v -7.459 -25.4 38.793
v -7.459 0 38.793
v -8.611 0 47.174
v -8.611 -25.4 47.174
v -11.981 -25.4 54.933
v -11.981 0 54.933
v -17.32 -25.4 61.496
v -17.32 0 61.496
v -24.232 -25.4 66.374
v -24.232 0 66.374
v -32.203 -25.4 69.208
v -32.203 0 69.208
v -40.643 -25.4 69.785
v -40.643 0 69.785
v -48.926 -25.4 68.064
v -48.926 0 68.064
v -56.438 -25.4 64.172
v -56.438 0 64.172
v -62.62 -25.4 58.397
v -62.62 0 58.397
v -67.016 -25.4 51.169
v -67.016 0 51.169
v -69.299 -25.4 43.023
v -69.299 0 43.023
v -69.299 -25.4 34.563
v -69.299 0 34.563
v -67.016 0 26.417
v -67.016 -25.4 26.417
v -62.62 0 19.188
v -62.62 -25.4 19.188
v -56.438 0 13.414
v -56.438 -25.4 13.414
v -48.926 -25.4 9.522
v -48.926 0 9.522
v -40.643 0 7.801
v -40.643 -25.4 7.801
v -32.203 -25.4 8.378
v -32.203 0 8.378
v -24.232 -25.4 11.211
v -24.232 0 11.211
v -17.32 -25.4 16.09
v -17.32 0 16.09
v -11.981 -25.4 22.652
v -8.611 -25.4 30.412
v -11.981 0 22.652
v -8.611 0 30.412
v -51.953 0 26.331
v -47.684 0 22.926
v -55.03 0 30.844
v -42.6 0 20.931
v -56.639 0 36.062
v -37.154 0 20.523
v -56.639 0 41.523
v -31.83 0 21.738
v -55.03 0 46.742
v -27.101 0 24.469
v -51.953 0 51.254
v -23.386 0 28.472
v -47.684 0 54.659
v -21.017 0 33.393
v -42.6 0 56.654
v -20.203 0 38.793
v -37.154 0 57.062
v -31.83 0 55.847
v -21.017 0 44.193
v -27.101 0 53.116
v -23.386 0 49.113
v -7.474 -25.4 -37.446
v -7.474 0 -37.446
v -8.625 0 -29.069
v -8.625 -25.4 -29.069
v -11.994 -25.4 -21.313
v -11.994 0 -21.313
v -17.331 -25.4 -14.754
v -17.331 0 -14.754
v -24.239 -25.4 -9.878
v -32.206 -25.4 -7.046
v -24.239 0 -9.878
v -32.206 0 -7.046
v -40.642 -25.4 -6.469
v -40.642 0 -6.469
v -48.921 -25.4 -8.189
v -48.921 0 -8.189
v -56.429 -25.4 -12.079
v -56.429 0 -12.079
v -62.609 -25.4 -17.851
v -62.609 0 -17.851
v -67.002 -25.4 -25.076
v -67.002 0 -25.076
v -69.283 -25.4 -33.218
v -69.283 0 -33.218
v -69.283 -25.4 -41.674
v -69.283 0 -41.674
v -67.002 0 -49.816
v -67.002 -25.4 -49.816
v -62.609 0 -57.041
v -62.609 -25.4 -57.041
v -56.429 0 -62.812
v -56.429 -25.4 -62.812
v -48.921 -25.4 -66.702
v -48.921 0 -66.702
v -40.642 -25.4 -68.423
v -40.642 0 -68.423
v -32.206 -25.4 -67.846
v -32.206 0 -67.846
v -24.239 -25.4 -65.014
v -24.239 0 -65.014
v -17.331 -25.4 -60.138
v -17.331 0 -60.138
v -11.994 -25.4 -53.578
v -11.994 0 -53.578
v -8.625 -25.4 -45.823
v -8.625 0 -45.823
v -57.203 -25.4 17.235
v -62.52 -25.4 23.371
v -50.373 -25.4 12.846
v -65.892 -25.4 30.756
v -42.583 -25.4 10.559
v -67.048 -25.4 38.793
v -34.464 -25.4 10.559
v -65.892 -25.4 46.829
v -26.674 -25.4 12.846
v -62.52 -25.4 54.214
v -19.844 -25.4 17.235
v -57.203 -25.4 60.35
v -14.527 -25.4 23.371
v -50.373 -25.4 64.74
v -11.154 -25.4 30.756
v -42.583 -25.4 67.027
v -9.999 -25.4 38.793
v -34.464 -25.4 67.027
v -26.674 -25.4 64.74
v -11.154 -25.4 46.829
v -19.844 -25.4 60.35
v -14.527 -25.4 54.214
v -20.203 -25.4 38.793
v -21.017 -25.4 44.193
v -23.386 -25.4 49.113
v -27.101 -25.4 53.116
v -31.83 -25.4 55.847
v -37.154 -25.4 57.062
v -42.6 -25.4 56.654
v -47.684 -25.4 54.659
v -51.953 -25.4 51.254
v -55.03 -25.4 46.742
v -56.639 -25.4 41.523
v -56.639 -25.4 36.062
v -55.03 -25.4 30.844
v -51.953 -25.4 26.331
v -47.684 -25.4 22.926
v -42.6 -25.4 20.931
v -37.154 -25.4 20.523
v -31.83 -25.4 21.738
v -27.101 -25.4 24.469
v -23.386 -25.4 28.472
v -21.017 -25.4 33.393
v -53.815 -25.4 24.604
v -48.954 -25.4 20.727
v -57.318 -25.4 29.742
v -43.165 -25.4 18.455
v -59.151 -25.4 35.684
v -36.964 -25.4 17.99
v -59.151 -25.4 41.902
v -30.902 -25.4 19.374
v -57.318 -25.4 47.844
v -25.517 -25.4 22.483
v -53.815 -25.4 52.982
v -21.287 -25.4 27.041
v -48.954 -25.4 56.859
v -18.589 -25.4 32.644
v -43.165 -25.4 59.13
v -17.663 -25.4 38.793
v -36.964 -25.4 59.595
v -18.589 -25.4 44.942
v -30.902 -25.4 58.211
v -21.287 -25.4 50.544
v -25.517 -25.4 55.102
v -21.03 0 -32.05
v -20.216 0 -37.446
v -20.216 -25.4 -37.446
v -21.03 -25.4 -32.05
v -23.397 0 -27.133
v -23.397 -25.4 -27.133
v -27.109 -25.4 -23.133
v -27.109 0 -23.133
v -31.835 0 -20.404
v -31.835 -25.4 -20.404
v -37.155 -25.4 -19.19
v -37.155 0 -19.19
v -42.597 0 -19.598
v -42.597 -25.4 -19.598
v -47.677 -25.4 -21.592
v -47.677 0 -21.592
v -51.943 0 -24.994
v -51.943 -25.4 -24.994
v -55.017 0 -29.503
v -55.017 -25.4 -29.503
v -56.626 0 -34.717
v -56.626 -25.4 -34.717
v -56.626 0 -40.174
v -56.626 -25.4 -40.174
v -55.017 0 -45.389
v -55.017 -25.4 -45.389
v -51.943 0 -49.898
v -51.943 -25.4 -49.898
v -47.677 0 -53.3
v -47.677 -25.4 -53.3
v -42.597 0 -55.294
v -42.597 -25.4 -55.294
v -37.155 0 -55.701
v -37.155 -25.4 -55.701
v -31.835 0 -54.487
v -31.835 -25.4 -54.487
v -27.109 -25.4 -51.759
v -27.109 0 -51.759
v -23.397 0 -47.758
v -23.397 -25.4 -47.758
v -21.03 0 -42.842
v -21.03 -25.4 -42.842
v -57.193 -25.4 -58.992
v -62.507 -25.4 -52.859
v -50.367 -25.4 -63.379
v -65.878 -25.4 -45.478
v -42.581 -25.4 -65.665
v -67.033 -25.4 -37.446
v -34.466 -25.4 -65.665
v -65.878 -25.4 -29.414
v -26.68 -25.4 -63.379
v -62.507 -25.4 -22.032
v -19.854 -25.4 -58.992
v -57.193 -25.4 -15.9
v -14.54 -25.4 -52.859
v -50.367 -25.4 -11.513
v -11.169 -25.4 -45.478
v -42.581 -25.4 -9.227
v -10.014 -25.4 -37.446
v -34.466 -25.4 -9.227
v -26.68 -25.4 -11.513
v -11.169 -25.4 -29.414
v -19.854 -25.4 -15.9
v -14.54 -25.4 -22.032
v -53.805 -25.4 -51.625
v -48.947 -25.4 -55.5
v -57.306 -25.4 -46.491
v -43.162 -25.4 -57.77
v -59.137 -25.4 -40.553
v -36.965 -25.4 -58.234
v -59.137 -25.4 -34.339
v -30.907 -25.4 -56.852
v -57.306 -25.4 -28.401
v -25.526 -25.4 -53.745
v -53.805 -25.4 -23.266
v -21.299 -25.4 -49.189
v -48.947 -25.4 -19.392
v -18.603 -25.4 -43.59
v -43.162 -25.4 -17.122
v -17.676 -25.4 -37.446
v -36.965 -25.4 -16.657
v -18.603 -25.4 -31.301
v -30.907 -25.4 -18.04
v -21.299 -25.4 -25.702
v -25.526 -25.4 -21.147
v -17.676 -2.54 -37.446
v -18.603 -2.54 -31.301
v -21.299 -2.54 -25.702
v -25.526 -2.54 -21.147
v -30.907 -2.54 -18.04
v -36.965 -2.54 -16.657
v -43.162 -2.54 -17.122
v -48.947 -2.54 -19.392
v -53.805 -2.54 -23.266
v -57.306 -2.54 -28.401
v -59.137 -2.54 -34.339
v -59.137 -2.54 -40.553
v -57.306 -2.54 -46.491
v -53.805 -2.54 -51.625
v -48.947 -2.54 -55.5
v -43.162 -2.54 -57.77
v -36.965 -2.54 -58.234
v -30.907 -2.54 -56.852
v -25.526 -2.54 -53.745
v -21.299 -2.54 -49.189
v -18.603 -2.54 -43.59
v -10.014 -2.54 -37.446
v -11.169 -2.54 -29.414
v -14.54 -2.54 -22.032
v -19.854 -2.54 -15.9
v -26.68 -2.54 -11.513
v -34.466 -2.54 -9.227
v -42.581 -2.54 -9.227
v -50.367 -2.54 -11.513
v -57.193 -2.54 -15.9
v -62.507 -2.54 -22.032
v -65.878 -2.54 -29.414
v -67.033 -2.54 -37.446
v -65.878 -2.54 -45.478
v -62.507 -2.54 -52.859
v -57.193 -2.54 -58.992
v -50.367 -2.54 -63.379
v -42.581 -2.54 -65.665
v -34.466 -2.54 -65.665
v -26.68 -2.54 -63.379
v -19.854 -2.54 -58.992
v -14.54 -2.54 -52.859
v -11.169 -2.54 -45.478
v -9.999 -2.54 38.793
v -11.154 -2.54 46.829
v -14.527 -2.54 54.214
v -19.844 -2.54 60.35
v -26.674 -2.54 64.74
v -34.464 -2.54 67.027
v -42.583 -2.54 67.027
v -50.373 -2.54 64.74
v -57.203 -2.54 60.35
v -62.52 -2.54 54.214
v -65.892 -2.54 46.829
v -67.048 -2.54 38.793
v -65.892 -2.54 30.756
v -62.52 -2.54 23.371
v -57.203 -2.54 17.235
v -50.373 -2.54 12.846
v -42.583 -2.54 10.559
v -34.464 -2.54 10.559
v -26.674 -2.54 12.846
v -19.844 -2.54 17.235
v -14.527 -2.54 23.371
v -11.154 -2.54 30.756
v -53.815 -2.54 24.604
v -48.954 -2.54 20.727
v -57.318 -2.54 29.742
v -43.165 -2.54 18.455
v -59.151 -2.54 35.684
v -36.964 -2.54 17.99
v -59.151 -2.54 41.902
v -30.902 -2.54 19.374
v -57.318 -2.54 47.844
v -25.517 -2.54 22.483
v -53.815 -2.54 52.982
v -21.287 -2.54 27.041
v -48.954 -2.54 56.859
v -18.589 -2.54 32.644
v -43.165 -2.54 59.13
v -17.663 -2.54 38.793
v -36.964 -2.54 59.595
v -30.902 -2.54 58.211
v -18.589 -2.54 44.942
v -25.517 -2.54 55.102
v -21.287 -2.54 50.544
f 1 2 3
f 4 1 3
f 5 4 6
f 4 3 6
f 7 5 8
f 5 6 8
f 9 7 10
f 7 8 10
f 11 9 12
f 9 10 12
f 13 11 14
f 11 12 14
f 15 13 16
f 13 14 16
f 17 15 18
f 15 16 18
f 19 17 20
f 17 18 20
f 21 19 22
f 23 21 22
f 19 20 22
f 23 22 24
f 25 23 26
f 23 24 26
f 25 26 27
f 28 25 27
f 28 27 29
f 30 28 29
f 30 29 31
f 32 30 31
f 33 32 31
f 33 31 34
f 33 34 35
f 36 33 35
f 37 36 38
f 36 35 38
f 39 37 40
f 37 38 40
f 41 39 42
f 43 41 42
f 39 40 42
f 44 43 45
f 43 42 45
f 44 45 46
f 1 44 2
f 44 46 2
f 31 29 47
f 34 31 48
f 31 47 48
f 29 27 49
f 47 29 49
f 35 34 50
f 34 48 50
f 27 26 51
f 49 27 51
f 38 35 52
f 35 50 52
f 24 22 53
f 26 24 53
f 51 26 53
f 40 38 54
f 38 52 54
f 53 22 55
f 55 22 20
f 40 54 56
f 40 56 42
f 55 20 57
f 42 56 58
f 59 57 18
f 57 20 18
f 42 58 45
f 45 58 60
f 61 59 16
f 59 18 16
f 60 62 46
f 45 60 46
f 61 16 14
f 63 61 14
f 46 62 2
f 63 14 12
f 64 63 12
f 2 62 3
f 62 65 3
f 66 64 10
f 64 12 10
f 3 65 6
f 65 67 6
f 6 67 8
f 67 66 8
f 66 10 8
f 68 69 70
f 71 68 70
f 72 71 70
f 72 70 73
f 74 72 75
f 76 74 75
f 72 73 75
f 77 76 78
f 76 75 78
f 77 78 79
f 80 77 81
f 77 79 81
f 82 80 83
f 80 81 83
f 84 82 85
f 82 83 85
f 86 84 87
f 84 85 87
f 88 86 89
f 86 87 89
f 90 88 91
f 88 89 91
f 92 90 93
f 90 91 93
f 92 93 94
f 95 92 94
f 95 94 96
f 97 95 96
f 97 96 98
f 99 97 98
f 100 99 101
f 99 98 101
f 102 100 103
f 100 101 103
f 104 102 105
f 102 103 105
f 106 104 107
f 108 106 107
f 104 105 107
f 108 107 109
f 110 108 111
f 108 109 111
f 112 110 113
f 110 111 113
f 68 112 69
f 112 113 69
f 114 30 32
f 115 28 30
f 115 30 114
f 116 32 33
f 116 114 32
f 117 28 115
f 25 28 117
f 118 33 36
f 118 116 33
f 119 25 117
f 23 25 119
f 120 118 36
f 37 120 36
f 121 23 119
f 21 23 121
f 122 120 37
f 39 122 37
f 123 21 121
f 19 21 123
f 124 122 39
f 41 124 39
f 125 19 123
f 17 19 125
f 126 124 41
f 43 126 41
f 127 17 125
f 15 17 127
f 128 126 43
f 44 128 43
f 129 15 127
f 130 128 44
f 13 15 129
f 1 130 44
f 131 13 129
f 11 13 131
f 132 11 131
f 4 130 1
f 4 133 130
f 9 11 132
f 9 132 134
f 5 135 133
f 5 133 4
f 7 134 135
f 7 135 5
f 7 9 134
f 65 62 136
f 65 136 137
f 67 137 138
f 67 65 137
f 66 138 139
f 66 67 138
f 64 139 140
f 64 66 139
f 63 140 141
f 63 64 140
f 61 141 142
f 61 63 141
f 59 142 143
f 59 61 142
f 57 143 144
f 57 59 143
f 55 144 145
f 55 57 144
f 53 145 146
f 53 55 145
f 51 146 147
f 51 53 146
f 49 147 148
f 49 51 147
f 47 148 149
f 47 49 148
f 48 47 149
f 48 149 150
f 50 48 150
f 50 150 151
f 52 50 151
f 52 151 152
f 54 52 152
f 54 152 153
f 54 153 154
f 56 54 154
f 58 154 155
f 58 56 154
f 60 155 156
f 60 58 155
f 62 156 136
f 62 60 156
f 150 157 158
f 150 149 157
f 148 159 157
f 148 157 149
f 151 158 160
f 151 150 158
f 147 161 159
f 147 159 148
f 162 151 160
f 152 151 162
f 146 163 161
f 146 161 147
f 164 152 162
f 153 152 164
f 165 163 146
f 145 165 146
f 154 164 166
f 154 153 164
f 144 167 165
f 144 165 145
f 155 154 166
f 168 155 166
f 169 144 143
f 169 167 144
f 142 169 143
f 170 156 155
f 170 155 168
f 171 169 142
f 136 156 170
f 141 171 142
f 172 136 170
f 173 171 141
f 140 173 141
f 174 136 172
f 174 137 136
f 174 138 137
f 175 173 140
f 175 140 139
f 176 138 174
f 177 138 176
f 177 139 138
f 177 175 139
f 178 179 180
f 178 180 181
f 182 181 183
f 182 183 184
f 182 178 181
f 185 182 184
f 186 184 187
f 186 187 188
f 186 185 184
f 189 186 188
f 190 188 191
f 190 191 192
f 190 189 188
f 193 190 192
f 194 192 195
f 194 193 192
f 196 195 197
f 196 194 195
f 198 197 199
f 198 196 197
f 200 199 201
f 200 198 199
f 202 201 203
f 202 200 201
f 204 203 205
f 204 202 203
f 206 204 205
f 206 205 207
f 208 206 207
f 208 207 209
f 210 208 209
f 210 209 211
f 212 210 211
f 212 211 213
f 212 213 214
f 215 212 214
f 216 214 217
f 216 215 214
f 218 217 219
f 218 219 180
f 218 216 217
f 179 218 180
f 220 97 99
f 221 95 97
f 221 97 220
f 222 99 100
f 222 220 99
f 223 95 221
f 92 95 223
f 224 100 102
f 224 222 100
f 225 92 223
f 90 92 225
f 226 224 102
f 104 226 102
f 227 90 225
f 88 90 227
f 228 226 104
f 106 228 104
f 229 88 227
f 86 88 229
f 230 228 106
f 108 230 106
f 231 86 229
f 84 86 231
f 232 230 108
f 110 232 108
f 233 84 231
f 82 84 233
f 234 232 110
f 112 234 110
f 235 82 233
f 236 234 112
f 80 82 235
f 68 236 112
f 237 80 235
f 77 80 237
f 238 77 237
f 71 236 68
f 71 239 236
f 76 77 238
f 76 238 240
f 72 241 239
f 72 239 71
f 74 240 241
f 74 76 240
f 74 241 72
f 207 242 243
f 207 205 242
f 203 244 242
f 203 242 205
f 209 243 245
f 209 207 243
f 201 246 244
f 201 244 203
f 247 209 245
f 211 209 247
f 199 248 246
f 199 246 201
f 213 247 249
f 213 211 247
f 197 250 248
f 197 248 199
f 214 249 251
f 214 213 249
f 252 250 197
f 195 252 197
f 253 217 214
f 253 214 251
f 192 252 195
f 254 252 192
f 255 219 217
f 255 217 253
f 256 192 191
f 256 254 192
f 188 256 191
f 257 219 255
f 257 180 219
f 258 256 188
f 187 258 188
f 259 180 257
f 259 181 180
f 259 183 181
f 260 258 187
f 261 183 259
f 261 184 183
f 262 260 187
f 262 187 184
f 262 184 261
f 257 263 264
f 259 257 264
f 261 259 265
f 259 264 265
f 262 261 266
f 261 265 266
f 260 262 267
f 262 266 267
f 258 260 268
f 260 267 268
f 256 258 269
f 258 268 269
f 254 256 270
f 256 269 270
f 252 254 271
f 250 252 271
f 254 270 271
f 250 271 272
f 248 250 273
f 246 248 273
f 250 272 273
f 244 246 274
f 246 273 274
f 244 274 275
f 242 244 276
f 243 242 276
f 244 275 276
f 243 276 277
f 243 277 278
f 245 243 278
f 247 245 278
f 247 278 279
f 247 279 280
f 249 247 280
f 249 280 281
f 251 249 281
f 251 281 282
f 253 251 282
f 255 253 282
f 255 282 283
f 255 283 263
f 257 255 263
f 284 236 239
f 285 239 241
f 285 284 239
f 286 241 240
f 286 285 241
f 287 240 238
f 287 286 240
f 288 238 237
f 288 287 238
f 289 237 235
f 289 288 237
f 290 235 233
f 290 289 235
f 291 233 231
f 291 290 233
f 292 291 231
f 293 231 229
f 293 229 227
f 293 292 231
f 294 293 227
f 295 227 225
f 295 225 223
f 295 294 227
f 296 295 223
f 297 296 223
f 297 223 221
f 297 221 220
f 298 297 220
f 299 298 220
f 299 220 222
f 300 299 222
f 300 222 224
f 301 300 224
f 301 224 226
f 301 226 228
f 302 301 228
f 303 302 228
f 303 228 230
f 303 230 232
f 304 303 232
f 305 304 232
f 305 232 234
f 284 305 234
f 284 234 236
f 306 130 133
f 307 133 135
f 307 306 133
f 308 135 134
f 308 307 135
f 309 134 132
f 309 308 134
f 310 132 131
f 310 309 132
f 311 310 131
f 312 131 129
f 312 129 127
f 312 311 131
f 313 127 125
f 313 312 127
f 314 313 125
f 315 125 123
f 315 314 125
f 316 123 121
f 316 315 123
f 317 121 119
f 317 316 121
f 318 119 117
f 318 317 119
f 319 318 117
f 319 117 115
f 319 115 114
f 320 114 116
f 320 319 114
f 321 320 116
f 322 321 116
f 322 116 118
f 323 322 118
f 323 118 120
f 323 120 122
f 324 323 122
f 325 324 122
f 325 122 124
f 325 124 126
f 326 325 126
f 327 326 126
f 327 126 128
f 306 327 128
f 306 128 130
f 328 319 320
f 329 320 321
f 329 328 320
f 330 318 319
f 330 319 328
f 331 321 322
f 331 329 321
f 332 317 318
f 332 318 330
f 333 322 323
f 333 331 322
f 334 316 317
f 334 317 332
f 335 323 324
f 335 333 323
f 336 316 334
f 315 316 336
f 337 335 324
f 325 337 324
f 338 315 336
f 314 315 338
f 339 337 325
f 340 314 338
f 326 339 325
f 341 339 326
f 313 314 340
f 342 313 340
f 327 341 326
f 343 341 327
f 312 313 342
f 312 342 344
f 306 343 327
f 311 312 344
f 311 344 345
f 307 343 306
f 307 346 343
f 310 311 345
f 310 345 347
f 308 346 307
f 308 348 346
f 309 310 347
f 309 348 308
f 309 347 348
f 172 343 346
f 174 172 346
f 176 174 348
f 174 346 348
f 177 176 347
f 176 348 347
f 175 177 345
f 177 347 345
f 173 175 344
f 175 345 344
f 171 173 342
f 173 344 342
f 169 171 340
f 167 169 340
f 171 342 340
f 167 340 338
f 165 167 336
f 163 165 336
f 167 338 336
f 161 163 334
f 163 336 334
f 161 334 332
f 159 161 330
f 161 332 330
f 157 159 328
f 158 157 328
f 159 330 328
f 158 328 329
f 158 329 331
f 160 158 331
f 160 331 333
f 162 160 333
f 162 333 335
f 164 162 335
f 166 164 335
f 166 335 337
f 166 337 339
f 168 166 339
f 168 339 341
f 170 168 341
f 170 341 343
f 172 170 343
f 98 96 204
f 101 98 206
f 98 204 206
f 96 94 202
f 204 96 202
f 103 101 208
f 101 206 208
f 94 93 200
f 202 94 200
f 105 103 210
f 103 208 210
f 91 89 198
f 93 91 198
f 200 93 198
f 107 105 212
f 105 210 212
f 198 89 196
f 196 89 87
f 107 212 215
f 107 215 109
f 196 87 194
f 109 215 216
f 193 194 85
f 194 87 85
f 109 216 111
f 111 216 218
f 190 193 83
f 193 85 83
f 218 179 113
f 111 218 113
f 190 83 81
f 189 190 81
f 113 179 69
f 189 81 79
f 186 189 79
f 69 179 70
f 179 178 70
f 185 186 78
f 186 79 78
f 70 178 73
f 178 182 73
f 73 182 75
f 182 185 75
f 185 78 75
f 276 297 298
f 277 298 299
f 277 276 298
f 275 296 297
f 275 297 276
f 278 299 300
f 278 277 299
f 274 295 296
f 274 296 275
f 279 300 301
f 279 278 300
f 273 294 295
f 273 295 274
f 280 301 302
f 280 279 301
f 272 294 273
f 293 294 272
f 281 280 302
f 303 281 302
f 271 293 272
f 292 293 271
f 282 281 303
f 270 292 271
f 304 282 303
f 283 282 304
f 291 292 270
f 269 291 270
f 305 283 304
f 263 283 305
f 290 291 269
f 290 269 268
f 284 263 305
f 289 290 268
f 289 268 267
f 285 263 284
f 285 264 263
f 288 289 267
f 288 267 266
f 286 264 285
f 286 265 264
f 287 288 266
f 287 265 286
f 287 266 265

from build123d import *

# Parameters (mm, degrees)
F0_R     = 31.0645198861
F0_R_2   = 18.3207695428
F1_DEPTH = 25.4
F0_R_3   = 31.0493317599
F0_R_4   = 18.3069012544
F2_T     = -2.54
F2_2_T   = -2.54


with BuildPart() as f1:
    # F0 (on Front) → F1 (new body)
    with BuildSketch(Plane.XZ):
        with Locations((-38.5233350098, 38.7927293777)):
            Circle(F0_R)
        with Locations((-38.5233350098, 38.7927293777)):
            Circle(F0_R_2, mode=Mode.SUBTRACT)
    extrude(amount=F1_DEPTH)

    # F2
    f2_openings = [f1.faces().sort_by_distance(p)[0] for p in [
        (-68.709218, -25.4, 38.792729),
    ]]
    offset(amount=F2_T, openings=f2_openings)


with BuildPart() as f1b:
    # F0 (on Front) → F1, piece 2 (new body)
    with BuildSketch(Plane.XZ):
        with Locations((-38.5233350098, -37.4457575381)):
            Circle(F0_R_3)
        with Locations((-38.5233350098, -37.4457575381)):
            Circle(F0_R_4, mode=Mode.SUBTRACT)
    extrude(amount=F1_DEPTH)

    # F2#2
    f2_2_openings = [f1b.faces().sort_by_distance(p)[0] for p in [
        (-68.694459, -25.4, -37.445758),
    ]]
    offset(amount=F2_2_T, openings=f2_2_openings)


solid = Compound([f1.part, f1b.part])
